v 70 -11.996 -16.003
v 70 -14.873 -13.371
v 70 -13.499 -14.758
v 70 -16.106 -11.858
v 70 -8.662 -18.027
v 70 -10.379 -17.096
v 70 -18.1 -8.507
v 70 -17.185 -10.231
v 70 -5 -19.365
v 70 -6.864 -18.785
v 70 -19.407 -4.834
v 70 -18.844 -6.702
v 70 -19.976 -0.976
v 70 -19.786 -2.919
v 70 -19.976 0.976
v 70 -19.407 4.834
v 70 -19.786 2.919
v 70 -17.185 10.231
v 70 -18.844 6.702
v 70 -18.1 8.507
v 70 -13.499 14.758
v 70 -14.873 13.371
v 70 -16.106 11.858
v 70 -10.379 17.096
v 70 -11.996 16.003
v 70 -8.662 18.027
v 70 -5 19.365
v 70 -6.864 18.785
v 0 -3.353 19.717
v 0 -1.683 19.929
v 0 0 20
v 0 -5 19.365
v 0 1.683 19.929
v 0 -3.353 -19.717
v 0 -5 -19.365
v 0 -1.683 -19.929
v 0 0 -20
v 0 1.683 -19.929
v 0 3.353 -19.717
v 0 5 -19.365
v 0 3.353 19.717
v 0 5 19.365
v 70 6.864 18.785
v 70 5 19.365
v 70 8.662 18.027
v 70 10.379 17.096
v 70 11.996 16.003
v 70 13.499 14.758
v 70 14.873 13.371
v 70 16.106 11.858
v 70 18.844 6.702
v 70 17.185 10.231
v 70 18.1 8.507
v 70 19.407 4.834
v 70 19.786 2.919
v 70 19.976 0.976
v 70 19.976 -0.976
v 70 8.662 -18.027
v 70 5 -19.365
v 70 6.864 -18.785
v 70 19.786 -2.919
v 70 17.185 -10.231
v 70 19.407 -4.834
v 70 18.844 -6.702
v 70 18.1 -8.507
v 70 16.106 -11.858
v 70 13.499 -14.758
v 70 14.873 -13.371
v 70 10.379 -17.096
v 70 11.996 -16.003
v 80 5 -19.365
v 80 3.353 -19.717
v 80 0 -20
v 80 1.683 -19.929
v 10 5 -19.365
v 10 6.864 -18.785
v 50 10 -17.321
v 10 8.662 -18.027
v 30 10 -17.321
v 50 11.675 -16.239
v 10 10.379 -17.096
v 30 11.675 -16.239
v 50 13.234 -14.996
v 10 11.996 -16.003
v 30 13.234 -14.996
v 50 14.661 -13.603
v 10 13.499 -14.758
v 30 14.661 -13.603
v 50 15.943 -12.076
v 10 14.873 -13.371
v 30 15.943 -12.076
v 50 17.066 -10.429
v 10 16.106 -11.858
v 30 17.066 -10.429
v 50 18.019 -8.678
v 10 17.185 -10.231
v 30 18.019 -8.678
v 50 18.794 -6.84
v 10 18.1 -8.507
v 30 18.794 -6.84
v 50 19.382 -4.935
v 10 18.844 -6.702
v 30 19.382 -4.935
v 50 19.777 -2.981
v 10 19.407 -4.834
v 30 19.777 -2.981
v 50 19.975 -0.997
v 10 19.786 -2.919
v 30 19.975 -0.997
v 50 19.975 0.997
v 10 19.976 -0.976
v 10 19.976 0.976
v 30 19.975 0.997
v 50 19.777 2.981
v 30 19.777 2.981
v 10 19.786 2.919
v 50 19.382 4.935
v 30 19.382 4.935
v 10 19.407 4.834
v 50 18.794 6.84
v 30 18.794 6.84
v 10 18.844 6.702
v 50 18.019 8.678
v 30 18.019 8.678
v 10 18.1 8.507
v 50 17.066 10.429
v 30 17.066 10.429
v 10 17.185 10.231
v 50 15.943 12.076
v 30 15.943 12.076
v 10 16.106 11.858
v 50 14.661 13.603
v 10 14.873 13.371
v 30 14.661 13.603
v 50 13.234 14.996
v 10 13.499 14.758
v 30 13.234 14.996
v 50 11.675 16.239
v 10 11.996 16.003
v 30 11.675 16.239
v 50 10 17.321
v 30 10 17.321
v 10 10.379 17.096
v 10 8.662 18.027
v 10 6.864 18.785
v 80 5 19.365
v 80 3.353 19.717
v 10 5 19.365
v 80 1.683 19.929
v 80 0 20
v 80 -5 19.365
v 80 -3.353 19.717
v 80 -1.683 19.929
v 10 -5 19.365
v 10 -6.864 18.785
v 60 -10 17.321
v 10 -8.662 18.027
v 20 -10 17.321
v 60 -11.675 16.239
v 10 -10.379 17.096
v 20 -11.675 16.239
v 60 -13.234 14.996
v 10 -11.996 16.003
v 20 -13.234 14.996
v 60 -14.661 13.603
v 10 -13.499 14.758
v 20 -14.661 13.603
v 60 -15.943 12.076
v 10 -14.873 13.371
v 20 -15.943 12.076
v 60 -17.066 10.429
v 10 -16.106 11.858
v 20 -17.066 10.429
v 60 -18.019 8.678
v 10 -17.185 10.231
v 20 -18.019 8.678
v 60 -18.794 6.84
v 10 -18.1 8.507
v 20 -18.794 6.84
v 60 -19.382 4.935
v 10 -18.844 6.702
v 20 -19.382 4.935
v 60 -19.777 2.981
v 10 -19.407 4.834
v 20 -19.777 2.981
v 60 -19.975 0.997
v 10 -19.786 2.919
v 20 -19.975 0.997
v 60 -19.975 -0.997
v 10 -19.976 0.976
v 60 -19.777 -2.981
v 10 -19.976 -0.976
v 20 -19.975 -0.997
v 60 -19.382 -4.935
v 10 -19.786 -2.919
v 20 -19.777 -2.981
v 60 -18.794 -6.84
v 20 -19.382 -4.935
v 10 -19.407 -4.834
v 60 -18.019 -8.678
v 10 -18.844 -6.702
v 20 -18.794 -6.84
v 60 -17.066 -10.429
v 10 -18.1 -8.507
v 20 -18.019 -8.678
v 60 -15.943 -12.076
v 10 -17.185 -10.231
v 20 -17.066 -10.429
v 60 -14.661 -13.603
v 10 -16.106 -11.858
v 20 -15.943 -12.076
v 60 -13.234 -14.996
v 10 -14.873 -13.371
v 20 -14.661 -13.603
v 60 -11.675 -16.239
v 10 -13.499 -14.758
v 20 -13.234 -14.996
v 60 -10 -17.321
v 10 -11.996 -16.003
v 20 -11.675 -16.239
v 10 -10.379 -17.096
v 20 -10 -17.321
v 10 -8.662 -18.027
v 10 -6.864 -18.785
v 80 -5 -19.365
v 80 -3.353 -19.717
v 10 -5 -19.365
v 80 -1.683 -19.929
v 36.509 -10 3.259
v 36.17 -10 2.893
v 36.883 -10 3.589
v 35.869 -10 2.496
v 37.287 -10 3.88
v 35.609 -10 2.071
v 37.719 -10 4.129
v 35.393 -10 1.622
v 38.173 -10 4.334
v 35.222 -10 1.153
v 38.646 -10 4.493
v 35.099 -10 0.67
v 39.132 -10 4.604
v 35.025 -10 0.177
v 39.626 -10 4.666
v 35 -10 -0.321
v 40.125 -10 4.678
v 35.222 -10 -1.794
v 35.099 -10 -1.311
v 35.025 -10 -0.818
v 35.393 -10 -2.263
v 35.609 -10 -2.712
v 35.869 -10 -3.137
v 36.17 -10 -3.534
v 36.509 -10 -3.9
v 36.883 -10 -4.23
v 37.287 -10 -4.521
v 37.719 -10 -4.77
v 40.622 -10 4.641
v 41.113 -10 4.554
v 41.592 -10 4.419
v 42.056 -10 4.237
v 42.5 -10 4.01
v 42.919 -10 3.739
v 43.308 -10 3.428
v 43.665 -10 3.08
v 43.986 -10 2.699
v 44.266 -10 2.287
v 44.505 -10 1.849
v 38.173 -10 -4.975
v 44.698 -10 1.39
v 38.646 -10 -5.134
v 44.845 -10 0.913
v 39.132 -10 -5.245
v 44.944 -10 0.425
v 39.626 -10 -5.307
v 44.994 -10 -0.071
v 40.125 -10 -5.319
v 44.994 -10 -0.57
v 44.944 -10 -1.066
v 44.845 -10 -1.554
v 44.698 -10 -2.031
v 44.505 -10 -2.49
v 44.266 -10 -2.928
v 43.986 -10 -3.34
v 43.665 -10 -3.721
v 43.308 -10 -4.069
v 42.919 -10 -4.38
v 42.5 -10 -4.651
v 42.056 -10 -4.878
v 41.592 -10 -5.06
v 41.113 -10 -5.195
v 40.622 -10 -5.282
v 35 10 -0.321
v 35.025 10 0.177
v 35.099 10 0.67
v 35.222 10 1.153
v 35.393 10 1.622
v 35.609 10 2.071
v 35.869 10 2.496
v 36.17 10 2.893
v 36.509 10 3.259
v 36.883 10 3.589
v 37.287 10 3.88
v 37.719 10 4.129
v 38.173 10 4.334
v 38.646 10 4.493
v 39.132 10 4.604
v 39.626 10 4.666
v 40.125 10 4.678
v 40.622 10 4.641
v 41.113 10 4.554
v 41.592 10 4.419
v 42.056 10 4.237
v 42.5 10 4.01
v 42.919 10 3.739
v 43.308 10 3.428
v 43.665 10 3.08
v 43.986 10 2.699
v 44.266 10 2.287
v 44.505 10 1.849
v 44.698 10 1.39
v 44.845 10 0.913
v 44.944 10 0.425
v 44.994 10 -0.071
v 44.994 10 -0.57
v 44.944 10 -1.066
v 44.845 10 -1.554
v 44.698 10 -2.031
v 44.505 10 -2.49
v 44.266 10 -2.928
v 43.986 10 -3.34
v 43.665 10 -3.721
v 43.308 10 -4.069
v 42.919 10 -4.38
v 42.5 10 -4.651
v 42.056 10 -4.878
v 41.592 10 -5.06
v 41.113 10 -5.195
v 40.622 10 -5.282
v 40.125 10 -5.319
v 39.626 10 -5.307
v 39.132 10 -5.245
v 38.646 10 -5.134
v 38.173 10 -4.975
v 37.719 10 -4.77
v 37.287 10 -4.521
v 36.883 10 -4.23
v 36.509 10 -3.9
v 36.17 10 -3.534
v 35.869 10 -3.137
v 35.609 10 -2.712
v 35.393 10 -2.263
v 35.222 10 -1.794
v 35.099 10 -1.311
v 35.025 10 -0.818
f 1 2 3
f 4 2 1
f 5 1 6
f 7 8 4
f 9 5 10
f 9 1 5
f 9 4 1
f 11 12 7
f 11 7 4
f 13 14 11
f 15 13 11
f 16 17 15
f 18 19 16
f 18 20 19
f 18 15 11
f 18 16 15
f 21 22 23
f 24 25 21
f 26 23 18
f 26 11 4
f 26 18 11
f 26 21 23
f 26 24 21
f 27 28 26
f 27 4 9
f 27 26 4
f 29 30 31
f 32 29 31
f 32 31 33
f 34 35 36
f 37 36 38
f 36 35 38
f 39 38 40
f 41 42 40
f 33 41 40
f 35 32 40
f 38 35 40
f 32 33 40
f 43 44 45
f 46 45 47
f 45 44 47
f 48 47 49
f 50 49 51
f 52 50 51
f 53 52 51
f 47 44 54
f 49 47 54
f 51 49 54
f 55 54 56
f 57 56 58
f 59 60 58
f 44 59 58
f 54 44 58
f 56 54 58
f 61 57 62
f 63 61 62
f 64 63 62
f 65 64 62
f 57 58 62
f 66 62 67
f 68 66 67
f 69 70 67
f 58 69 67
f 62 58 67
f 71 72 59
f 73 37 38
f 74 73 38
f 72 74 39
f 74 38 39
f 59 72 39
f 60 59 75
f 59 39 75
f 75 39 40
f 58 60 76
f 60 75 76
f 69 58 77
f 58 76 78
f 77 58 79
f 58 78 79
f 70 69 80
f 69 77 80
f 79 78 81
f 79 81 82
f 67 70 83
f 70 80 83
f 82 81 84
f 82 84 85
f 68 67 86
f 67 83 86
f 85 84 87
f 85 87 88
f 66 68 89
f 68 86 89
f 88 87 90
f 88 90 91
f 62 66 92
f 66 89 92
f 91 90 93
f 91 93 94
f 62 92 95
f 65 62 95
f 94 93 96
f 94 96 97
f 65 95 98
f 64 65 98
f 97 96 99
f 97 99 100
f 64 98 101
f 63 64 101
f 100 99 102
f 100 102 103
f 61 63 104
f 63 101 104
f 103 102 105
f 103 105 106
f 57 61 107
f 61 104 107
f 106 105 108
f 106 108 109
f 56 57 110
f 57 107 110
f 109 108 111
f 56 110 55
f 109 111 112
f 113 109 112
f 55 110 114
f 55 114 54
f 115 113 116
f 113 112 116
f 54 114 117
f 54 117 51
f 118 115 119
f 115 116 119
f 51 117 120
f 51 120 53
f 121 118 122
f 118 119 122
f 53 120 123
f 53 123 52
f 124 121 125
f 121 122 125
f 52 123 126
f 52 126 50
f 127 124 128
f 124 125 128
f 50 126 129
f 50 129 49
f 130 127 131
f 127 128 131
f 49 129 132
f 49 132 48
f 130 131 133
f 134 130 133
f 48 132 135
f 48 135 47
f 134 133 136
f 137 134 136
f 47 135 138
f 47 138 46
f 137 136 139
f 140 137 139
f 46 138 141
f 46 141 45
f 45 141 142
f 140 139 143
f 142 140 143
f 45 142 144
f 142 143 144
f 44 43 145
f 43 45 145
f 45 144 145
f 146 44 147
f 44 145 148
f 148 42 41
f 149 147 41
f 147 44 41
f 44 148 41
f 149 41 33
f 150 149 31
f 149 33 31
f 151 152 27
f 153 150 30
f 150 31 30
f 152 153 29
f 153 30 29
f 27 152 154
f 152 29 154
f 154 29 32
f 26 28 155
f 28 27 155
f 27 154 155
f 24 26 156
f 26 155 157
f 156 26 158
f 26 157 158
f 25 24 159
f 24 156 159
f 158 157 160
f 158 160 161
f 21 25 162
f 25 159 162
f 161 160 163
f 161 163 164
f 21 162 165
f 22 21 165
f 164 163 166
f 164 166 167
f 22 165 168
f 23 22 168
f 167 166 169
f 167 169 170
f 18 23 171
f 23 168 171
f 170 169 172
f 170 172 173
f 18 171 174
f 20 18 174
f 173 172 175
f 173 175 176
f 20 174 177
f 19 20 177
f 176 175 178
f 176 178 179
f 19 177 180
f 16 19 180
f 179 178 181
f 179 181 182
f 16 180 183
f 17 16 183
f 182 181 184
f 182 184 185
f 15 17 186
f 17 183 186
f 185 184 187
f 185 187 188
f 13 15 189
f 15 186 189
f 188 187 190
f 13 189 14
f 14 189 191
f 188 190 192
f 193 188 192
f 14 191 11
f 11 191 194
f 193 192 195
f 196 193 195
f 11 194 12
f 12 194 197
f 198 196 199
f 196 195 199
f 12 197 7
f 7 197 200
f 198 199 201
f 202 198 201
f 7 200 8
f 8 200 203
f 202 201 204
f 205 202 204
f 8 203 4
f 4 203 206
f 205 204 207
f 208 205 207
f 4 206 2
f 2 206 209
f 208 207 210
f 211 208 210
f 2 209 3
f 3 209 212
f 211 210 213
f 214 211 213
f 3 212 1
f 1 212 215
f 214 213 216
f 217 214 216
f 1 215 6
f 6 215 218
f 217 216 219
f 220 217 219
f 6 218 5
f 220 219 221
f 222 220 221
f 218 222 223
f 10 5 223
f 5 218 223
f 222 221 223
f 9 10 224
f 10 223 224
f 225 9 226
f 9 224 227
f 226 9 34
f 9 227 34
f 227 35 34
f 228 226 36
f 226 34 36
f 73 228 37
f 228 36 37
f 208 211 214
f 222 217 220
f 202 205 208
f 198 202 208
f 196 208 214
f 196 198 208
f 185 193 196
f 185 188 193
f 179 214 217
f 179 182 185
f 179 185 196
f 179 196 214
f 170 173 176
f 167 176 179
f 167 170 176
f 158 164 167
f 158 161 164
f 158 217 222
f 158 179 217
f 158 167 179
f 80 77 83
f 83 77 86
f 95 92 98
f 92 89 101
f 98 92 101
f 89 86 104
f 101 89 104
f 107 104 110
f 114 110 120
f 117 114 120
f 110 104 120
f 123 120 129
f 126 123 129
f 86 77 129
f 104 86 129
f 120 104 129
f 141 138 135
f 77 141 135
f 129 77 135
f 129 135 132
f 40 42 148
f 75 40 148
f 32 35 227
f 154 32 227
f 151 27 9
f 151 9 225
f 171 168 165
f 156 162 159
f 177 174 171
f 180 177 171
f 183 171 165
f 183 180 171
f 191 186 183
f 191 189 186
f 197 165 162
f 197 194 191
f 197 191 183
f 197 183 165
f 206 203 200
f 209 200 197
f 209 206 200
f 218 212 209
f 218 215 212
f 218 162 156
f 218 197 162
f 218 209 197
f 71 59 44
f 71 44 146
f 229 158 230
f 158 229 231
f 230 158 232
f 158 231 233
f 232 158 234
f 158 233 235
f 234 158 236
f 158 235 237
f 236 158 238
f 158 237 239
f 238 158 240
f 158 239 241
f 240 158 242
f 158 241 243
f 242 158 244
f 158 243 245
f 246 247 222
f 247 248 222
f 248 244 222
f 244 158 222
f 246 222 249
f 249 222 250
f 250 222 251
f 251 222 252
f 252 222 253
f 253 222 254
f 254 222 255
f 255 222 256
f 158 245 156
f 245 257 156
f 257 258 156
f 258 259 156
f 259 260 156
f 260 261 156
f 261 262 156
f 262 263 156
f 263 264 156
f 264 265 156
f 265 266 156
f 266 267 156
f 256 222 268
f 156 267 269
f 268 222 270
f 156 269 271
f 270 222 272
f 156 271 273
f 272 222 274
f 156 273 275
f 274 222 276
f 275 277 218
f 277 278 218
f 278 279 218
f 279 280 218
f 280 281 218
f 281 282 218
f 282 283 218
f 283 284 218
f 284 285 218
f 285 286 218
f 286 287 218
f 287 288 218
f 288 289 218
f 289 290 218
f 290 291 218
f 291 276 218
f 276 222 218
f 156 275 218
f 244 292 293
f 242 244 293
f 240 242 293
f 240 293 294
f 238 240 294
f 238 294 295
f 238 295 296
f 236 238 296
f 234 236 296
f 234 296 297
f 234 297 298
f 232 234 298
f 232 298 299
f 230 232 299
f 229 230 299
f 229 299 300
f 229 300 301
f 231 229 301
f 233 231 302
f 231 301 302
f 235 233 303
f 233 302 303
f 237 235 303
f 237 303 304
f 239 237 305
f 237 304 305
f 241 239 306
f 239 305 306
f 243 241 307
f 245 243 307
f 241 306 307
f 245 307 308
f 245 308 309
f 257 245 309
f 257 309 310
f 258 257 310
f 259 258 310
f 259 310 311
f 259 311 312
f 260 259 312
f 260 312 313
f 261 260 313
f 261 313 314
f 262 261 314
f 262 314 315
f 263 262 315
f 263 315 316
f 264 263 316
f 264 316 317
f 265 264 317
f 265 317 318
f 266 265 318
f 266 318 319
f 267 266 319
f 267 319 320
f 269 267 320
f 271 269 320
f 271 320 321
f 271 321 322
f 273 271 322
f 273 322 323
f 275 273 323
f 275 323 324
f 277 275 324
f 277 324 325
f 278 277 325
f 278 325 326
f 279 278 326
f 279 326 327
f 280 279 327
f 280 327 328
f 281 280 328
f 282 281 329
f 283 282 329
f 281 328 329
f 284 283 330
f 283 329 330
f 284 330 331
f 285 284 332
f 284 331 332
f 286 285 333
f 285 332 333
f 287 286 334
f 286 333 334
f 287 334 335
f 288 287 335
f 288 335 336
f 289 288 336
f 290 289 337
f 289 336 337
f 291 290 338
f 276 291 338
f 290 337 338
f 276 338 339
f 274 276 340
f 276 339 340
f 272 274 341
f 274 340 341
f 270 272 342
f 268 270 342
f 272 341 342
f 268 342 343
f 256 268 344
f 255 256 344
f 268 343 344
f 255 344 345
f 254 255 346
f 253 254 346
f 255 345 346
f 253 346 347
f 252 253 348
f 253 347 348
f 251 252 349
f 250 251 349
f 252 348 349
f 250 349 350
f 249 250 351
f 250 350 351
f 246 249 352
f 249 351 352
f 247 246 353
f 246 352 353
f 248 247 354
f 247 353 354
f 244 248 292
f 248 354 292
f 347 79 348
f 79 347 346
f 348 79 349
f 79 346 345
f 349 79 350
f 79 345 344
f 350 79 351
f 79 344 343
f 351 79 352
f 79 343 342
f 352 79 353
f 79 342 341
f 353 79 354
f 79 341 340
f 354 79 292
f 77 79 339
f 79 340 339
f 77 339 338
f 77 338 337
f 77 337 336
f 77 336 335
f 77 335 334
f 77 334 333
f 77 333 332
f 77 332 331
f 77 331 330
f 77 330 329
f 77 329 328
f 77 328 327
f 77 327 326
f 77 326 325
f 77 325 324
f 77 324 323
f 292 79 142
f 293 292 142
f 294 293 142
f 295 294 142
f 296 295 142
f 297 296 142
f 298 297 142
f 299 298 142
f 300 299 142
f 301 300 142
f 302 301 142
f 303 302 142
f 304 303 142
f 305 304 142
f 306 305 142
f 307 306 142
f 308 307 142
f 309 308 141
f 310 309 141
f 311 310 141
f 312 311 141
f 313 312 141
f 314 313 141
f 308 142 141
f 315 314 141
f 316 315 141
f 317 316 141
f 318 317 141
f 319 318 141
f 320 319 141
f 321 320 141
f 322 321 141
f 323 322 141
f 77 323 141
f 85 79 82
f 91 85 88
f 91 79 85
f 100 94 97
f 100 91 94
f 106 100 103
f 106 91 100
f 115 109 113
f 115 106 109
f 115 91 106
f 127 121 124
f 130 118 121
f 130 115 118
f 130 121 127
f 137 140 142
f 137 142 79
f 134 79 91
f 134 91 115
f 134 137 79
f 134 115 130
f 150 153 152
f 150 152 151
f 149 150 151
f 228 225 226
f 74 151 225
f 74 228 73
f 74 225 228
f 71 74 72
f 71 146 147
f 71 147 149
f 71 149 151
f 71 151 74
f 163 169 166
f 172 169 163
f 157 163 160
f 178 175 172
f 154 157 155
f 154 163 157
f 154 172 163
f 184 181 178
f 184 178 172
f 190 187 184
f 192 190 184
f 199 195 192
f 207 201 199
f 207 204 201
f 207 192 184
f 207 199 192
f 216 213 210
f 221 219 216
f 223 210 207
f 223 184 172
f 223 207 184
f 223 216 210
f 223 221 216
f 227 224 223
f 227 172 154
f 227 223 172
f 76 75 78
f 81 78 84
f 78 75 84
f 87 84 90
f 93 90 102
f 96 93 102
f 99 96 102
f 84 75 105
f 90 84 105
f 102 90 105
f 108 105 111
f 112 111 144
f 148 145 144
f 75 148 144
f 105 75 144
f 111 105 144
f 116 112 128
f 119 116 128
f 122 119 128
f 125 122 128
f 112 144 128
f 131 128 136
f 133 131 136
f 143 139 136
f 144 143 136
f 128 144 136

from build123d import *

# Parameters (mm, degrees)
SKETCH1_R                           = 20
BOSS_EXTRUDE1_DEPTH                 = 80
CUT_EXTRUDE1_REACH                  = 86.853
CUT_EXTRUDE1_END_RADIUS             = 20
SKETCH2_W                           = 20
SKETCH2_H                           = 10
SKETCH2_W_2                         = 10
SKETCH2_H_2                         = 15
SKETCH2_W_3                         = 40
CUT_EXTRUDE1_DIRECTION_2_REACH      = 86.853
CUT_EXTRUDE1_DIRECTION_2_END_RADIUS = 20
CUT_EXTRUDE2_REACH                  = 89.75
SKETCH3_R                           = 5


with BuildPart() as part:
    # Sketch1 → Boss-Extrude1 (new body)
    with BuildSketch(Plane(origin=(0, 0, 0), x_dir=(0, 0, -1), z_dir=(1, 0, 0))):
        Circle(SKETCH1_R)
    extrude(amount=BOSS_EXTRUDE1_DEPTH)

    # Cut-Extrude1: up to this cylinder (the profile starts inside it)
    cut_extrude1_end = Plane(origin=(40, 0, 0), z_dir=(-1, 0, 0)) * Cylinder(CUT_EXTRUDE1_END_RADIUS, 284.706, mode=Mode.PRIVATE)
    # Sketch2 → Cut-Extrude1 (cut, up to the surface)
    with BuildSketch(Plane.XY, mode=Mode.PRIVATE) as cut_extrude1_sk1:
        with Locations((40, 15)):
            Rectangle(SKETCH2_W, SKETCH2_H)
    cut_extrude1_tool1 = extrude(cut_extrude1_sk1.sketch, amount=-CUT_EXTRUDE1_REACH, mode=Mode.PRIVATE) & cut_extrude1_end
    add(cut_extrude1_tool1.solids().sort_by_distance((40, 15, 0))[0], mode=Mode.SUBTRACT)
    # Sketch2 → Cut-Extrude1 (cut, up to the surface)
    with BuildSketch(Plane.XY, mode=Mode.PRIVATE) as cut_extrude1_sk2:
        with Locations((5, 12.5)):
            Rectangle(SKETCH2_W_2, SKETCH2_H_2)
    cut_extrude1_tool2 = extrude(cut_extrude1_sk2.sketch, amount=-CUT_EXTRUDE1_REACH, mode=Mode.PRIVATE) & cut_extrude1_end
    add(cut_extrude1_tool2.solids().sort_by_distance((5, 12.5, 0))[0], mode=Mode.SUBTRACT)
    # Sketch2 → Cut-Extrude1 (cut, up to the surface)
    with BuildSketch(Plane.XY, mode=Mode.PRIVATE) as cut_extrude1_sk3:
        with Locations((5, -12.5)):
            Rectangle(SKETCH2_W_2, SKETCH2_H_2)
    cut_extrude1_tool3 = extrude(cut_extrude1_sk3.sketch, amount=-CUT_EXTRUDE1_REACH, mode=Mode.PRIVATE) & cut_extrude1_end
    add(cut_extrude1_tool3.solids().sort_by_distance((5, -12.5, 0))[0], mode=Mode.SUBTRACT)
    # Sketch2 → Cut-Extrude1 (cut, up to the surface)
    with BuildSketch(Plane.XY, mode=Mode.PRIVATE) as cut_extrude1_sk4:
        with Locations((75, 12.5)):
            Rectangle(SKETCH2_W_2, SKETCH2_H_2)
    cut_extrude1_tool4 = extrude(cut_extrude1_sk4.sketch, amount=-CUT_EXTRUDE1_REACH, mode=Mode.PRIVATE) & cut_extrude1_end
    add(cut_extrude1_tool4.solids().sort_by_distance((75, 12.5, 0))[0], mode=Mode.SUBTRACT)
    # Sketch2 → Cut-Extrude1 (cut, up to the surface)
    with BuildSketch(Plane.XY, mode=Mode.PRIVATE) as cut_extrude1_sk5:
        with Locations((75, -12.5)):
            Rectangle(SKETCH2_W_2, SKETCH2_H_2)
    cut_extrude1_tool5 = extrude(cut_extrude1_sk5.sketch, amount=-CUT_EXTRUDE1_REACH, mode=Mode.PRIVATE) & cut_extrude1_end
    add(cut_extrude1_tool5.solids().sort_by_distance((75, -12.5, 0))[0], mode=Mode.SUBTRACT)
    # Sketch2 → Cut-Extrude1 (cut, up to the surface)
    with BuildSketch(Plane.XY, mode=Mode.PRIVATE) as cut_extrude1_sk6:
        with Locations((40, -15)):
            Rectangle(SKETCH2_W_3, SKETCH2_H)
    cut_extrude1_tool6 = extrude(cut_extrude1_sk6.sketch, amount=-CUT_EXTRUDE1_REACH, mode=Mode.PRIVATE) & cut_extrude1_end
    add(cut_extrude1_tool6.solids().sort_by_distance((40, -15, 0))[0], mode=Mode.SUBTRACT)

    # Cut-Extrude1 direction 2: up to this cylinder (the profile starts inside it)
    cut_extrude1_direction_2_end = Plane(origin=(40, 0, 0), z_dir=(-1, 0, 0)) * Cylinder(CUT_EXTRUDE1_DIRECTION_2_END_RADIUS, 284.706, mode=Mode.PRIVATE)
    # Sketch2 → Cut-Extrude1 direction 2 (cut, up to the surface)
    with BuildSketch(Plane.XY, mode=Mode.PRIVATE) as cut_extrude1_direction_2_sk1:
        with Locations((40, 15)):
            Rectangle(SKETCH2_W, SKETCH2_H)
    cut_extrude1_direction_2_tool1 = extrude(cut_extrude1_direction_2_sk1.sketch, amount=CUT_EXTRUDE1_DIRECTION_2_REACH, mode=Mode.PRIVATE) & cut_extrude1_direction_2_end
    add(cut_extrude1_direction_2_tool1.solids().sort_by_distance((40, 15, 0))[0], mode=Mode.SUBTRACT)
    # Sketch2 → Cut-Extrude1 direction 2 (cut, up to the surface)
    with BuildSketch(Plane.XY, mode=Mode.PRIVATE) as cut_extrude1_direction_2_sk2:
        with Locations((5, 12.5)):
            Rectangle(SKETCH2_W_2, SKETCH2_H_2)
    cut_extrude1_direction_2_tool2 = extrude(cut_extrude1_direction_2_sk2.sketch, amount=CUT_EXTRUDE1_DIRECTION_2_REACH, mode=Mode.PRIVATE) & cut_extrude1_direction_2_end
    add(cut_extrude1_direction_2_tool2.solids().sort_by_distance((5, 12.5, 0))[0], mode=Mode.SUBTRACT)
    # Sketch2 → Cut-Extrude1 direction 2 (cut, up to the surface)
    with BuildSketch(Plane.XY, mode=Mode.PRIVATE) as cut_extrude1_direction_2_sk3:
        with Locations((5, -12.5)):
            Rectangle(SKETCH2_W_2, SKETCH2_H_2)
    cut_extrude1_direction_2_tool3 = extrude(cut_extrude1_direction_2_sk3.sketch, amount=CUT_EXTRUDE1_DIRECTION_2_REACH, mode=Mode.PRIVATE) & cut_extrude1_direction_2_end
    add(cut_extrude1_direction_2_tool3.solids().sort_by_distance((5, -12.5, 0))[0], mode=Mode.SUBTRACT)
    # Sketch2 → Cut-Extrude1 direction 2 (cut, up to the surface)
    with BuildSketch(Plane.XY, mode=Mode.PRIVATE) as cut_extrude1_direction_2_sk4:
        with Locations((75, 12.5)):
            Rectangle(SKETCH2_W_2, SKETCH2_H_2)
    cut_extrude1_direction_2_tool4 = extrude(cut_extrude1_direction_2_sk4.sketch, amount=CUT_EXTRUDE1_DIRECTION_2_REACH, mode=Mode.PRIVATE) & cut_extrude1_direction_2_end
    add(cut_extrude1_direction_2_tool4.solids().sort_by_distance((75, 12.5, 0))[0], mode=Mode.SUBTRACT)
    # Sketch2 → Cut-Extrude1 direction 2 (cut, up to the surface)
    with BuildSketch(Plane.XY, mode=Mode.PRIVATE) as cut_extrude1_direction_2_sk5:
        with Locations((75, -12.5)):
            Rectangle(SKETCH2_W_2, SKETCH2_H_2)
    cut_extrude1_direction_2_tool5 = extrude(cut_extrude1_direction_2_sk5.sketch, amount=CUT_EXTRUDE1_DIRECTION_2_REACH, mode=Mode.PRIVATE) & cut_extrude1_direction_2_end
    add(cut_extrude1_direction_2_tool5.solids().sort_by_distance((75, -12.5, 0))[0], mode=Mode.SUBTRACT)
    # Sketch2 → Cut-Extrude1 direction 2 (cut, up to the surface)
    with BuildSketch(Plane.XY, mode=Mode.PRIVATE) as cut_extrude1_direction_2_sk6:
        with Locations((40, -15)):
            Rectangle(SKETCH2_W_3, SKETCH2_H)
    cut_extrude1_direction_2_tool6 = extrude(cut_extrude1_direction_2_sk6.sketch, amount=CUT_EXTRUDE1_DIRECTION_2_REACH, mode=Mode.PRIVATE) & cut_extrude1_direction_2_end
    add(cut_extrude1_direction_2_tool6.solids().sort_by_distance((40, -15, 0))[0], mode=Mode.SUBTRACT)

    # Sketch3 → Cut-Extrude2 (cut, up to next)
    with BuildSketch(Plane(origin=(0, 10, 0), x_dir=(1, 0, 0), z_dir=(0, 1, 0)), mode=Mode.PRIVATE) as cut_extrude2_sk1:
        with Locations(Location((40, 0.320508076, 0), (0, 0, 180))):
            Circle(SKETCH3_R)
    cut_extrude2_tool1 = extrude(cut_extrude2_sk1.sketch, amount=-CUT_EXTRUDE2_REACH, mode=Mode.PRIVATE) & part.part
    add(cut_extrude2_tool1.solids().sort_by_distance((40, 10, -0.320508))[0], mode=Mode.SUBTRACT)


solid = part.part
